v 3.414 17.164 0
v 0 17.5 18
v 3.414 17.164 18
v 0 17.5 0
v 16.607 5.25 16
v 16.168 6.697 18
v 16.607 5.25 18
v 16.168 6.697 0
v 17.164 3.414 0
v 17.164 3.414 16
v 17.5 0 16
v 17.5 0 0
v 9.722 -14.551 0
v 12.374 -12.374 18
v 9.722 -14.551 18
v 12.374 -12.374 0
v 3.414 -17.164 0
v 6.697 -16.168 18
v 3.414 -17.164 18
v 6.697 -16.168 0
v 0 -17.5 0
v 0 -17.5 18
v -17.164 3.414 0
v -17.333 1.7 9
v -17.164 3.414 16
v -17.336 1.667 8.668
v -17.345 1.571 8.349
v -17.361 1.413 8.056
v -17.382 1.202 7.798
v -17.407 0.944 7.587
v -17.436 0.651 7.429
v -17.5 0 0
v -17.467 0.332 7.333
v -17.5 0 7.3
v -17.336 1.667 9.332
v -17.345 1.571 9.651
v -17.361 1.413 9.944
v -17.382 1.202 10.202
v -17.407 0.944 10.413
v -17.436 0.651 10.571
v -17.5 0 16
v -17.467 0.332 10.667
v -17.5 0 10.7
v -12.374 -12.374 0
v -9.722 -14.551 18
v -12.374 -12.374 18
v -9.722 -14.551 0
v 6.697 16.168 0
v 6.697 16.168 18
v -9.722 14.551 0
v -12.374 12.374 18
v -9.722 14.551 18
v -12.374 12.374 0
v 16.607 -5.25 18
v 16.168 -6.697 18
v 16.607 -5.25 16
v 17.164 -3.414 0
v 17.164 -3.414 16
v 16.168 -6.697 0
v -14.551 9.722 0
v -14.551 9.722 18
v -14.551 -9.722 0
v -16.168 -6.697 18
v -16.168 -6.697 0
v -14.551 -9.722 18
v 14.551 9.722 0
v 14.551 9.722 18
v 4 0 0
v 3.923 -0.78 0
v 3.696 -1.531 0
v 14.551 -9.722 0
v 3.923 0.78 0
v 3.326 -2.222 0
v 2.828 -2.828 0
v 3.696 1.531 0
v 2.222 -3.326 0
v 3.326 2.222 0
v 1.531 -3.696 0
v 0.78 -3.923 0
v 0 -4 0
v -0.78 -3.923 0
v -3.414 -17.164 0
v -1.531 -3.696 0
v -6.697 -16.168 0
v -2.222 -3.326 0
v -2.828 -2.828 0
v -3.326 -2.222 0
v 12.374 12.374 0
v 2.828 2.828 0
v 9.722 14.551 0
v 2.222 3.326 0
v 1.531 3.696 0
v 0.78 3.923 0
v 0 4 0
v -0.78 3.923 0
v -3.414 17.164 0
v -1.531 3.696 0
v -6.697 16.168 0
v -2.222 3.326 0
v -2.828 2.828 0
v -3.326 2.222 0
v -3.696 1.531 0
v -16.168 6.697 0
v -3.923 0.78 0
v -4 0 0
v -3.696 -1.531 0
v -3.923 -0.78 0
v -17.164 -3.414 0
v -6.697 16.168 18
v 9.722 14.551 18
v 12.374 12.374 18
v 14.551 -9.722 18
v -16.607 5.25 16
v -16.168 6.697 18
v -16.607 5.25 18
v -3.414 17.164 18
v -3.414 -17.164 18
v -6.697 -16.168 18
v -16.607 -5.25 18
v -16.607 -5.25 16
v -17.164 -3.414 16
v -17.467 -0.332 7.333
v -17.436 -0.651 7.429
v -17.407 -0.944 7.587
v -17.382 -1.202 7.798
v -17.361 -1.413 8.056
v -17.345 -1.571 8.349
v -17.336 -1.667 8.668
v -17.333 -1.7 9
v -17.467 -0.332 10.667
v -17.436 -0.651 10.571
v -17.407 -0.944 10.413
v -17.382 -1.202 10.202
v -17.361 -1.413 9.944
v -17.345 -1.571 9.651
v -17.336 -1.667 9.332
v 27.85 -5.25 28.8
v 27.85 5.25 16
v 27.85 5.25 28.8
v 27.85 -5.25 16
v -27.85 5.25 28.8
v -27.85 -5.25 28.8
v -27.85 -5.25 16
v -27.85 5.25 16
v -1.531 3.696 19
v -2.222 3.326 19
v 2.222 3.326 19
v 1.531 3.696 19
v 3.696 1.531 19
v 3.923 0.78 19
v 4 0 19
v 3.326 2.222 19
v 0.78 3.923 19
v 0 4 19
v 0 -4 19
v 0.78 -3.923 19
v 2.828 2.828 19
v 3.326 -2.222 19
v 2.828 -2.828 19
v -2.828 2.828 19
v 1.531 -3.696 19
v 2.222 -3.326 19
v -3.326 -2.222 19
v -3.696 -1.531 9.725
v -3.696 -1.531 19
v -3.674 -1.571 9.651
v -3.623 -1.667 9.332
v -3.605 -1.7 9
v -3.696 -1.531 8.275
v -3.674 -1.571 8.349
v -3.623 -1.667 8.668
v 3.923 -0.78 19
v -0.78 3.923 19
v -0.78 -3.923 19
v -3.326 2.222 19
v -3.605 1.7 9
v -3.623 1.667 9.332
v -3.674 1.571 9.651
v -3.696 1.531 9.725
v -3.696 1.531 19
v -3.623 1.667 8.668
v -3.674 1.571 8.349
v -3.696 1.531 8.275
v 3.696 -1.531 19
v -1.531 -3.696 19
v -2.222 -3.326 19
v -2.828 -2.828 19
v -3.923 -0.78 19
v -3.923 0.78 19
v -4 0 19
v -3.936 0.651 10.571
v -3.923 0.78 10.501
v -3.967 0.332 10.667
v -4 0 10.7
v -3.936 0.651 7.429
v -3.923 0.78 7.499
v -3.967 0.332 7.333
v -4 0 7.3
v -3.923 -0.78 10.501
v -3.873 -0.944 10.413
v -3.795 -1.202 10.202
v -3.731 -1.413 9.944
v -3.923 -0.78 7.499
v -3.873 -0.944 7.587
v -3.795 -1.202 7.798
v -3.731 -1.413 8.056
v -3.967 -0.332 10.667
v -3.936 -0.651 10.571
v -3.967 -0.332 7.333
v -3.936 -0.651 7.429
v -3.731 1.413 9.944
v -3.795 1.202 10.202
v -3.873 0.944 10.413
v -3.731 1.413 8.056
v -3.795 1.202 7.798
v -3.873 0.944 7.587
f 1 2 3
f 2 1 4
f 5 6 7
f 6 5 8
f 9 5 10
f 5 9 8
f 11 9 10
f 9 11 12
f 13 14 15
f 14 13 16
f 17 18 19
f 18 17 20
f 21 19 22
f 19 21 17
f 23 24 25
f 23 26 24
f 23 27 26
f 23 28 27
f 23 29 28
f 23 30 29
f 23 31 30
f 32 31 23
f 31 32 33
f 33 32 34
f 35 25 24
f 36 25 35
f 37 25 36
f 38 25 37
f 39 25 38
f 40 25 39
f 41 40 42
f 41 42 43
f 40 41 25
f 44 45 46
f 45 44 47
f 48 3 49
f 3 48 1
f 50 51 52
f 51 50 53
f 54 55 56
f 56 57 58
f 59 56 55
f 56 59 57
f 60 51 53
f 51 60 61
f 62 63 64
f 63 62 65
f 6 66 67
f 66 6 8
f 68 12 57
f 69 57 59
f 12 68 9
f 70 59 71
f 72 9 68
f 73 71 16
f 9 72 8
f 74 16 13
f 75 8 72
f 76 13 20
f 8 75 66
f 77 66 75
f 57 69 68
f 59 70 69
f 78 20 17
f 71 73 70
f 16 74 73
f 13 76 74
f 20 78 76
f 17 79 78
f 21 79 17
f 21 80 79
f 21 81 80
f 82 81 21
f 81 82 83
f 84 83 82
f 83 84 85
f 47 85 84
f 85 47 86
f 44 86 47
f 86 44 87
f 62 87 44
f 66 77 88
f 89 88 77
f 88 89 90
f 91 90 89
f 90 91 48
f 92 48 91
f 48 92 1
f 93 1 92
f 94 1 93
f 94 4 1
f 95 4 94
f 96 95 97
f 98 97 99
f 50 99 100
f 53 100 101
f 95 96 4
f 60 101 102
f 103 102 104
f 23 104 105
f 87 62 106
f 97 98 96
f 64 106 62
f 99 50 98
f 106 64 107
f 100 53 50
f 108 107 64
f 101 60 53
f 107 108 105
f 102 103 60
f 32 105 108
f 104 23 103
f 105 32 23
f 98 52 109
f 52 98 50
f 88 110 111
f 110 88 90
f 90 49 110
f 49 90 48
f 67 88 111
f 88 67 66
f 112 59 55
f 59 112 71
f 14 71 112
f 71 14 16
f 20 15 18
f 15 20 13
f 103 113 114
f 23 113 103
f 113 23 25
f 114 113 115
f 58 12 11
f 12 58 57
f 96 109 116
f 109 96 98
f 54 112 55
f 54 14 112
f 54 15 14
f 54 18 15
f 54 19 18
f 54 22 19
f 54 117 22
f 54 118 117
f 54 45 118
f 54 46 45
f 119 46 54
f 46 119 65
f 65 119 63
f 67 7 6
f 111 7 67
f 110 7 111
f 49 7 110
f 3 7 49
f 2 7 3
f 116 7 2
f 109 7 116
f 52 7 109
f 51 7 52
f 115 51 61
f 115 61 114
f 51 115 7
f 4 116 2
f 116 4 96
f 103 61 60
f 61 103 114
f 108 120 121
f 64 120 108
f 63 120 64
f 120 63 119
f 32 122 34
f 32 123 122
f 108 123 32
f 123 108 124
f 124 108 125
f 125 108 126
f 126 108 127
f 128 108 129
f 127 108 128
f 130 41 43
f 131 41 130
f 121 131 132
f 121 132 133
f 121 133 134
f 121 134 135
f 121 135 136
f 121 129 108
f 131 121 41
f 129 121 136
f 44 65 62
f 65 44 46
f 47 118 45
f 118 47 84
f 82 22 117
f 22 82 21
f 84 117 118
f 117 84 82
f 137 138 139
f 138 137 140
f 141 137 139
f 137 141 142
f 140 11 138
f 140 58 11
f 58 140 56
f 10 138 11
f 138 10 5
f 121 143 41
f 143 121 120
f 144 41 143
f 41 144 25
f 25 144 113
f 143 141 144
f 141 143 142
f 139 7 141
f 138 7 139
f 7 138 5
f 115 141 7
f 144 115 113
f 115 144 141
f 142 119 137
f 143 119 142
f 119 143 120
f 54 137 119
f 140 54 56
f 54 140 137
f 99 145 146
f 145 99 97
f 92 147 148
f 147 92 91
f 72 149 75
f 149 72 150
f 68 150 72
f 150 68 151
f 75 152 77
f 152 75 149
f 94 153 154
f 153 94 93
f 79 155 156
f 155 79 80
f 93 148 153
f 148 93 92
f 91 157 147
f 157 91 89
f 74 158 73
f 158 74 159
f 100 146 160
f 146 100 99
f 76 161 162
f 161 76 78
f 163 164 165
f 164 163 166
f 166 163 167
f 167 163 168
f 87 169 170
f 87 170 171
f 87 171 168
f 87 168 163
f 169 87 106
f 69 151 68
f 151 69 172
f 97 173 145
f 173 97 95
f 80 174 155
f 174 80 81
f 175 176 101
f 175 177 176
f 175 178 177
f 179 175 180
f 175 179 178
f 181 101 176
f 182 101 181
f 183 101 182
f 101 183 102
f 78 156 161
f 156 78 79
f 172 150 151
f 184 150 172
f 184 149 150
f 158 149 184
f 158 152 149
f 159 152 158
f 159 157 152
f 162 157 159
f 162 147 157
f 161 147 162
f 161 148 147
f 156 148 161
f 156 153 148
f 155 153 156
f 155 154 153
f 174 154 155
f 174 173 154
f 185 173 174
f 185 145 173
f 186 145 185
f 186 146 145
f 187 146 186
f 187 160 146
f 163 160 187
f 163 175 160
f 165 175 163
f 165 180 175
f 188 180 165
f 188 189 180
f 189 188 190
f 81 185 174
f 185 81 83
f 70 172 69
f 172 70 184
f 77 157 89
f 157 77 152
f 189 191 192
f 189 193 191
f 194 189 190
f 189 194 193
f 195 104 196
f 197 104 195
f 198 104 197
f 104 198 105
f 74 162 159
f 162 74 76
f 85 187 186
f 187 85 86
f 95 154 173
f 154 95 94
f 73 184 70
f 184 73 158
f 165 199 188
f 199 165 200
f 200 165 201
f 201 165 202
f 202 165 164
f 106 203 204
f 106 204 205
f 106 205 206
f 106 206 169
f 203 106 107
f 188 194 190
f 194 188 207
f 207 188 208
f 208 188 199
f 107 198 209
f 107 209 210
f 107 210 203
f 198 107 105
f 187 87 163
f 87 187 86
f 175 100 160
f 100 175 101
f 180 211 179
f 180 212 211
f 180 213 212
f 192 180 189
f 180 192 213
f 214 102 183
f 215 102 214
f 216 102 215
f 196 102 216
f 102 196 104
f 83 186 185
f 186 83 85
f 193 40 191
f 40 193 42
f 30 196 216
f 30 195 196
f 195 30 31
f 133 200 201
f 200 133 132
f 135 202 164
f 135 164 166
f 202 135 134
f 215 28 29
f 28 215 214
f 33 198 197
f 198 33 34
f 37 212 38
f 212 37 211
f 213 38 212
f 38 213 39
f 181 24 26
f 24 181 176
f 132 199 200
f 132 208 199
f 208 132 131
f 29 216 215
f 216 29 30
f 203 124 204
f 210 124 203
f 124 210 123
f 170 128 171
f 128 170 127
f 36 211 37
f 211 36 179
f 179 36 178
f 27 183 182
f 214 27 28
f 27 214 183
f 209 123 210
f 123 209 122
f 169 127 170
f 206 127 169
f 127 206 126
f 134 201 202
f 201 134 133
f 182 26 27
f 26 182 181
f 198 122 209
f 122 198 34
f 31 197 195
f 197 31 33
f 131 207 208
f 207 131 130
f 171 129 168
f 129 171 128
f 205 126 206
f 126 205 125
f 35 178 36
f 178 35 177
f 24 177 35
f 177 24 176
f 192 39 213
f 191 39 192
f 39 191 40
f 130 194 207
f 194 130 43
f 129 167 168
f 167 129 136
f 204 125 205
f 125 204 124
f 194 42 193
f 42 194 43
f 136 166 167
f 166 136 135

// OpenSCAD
$fn = 32;

// ----------------------------------------------------------------------
// Hand knob: 35 x 55.7 x 18 mm
// ----------------------------------------------------------------------

// --- parameters (mm) ---
head_d = 35;              // knob diameter
head_h = 18;              // knob height
hole_d = 8;               // shaft bore
set_d = 3.4;              // set screw tap hole
wing_l = 55.7;            // wing span
wing_w = 10.5;            // wing width
wing_h = 10.8;            // wing thickness

module body() {
  cylinder(h = head_h, d = head_d);
}

module wing() {
  /* wing sunk 2 mm into the knob so the joint overlaps */
  translate([-wing_l / 2, -wing_w / 2, head_h - 2])
    cube([wing_l, wing_w, wing_h + 2]);
}

difference() {
  union() {
    body();
    wing();
  }
  translate([0, 0, -1]) cylinder(h = head_h + 0 + 2, d = hole_d);
  translate([-head_d / 2 - 1, 0, head_h * 0.5]) rotate([0, 90, 0]) cylinder(h = head_d / 2 + 2, d = set_d);
}
